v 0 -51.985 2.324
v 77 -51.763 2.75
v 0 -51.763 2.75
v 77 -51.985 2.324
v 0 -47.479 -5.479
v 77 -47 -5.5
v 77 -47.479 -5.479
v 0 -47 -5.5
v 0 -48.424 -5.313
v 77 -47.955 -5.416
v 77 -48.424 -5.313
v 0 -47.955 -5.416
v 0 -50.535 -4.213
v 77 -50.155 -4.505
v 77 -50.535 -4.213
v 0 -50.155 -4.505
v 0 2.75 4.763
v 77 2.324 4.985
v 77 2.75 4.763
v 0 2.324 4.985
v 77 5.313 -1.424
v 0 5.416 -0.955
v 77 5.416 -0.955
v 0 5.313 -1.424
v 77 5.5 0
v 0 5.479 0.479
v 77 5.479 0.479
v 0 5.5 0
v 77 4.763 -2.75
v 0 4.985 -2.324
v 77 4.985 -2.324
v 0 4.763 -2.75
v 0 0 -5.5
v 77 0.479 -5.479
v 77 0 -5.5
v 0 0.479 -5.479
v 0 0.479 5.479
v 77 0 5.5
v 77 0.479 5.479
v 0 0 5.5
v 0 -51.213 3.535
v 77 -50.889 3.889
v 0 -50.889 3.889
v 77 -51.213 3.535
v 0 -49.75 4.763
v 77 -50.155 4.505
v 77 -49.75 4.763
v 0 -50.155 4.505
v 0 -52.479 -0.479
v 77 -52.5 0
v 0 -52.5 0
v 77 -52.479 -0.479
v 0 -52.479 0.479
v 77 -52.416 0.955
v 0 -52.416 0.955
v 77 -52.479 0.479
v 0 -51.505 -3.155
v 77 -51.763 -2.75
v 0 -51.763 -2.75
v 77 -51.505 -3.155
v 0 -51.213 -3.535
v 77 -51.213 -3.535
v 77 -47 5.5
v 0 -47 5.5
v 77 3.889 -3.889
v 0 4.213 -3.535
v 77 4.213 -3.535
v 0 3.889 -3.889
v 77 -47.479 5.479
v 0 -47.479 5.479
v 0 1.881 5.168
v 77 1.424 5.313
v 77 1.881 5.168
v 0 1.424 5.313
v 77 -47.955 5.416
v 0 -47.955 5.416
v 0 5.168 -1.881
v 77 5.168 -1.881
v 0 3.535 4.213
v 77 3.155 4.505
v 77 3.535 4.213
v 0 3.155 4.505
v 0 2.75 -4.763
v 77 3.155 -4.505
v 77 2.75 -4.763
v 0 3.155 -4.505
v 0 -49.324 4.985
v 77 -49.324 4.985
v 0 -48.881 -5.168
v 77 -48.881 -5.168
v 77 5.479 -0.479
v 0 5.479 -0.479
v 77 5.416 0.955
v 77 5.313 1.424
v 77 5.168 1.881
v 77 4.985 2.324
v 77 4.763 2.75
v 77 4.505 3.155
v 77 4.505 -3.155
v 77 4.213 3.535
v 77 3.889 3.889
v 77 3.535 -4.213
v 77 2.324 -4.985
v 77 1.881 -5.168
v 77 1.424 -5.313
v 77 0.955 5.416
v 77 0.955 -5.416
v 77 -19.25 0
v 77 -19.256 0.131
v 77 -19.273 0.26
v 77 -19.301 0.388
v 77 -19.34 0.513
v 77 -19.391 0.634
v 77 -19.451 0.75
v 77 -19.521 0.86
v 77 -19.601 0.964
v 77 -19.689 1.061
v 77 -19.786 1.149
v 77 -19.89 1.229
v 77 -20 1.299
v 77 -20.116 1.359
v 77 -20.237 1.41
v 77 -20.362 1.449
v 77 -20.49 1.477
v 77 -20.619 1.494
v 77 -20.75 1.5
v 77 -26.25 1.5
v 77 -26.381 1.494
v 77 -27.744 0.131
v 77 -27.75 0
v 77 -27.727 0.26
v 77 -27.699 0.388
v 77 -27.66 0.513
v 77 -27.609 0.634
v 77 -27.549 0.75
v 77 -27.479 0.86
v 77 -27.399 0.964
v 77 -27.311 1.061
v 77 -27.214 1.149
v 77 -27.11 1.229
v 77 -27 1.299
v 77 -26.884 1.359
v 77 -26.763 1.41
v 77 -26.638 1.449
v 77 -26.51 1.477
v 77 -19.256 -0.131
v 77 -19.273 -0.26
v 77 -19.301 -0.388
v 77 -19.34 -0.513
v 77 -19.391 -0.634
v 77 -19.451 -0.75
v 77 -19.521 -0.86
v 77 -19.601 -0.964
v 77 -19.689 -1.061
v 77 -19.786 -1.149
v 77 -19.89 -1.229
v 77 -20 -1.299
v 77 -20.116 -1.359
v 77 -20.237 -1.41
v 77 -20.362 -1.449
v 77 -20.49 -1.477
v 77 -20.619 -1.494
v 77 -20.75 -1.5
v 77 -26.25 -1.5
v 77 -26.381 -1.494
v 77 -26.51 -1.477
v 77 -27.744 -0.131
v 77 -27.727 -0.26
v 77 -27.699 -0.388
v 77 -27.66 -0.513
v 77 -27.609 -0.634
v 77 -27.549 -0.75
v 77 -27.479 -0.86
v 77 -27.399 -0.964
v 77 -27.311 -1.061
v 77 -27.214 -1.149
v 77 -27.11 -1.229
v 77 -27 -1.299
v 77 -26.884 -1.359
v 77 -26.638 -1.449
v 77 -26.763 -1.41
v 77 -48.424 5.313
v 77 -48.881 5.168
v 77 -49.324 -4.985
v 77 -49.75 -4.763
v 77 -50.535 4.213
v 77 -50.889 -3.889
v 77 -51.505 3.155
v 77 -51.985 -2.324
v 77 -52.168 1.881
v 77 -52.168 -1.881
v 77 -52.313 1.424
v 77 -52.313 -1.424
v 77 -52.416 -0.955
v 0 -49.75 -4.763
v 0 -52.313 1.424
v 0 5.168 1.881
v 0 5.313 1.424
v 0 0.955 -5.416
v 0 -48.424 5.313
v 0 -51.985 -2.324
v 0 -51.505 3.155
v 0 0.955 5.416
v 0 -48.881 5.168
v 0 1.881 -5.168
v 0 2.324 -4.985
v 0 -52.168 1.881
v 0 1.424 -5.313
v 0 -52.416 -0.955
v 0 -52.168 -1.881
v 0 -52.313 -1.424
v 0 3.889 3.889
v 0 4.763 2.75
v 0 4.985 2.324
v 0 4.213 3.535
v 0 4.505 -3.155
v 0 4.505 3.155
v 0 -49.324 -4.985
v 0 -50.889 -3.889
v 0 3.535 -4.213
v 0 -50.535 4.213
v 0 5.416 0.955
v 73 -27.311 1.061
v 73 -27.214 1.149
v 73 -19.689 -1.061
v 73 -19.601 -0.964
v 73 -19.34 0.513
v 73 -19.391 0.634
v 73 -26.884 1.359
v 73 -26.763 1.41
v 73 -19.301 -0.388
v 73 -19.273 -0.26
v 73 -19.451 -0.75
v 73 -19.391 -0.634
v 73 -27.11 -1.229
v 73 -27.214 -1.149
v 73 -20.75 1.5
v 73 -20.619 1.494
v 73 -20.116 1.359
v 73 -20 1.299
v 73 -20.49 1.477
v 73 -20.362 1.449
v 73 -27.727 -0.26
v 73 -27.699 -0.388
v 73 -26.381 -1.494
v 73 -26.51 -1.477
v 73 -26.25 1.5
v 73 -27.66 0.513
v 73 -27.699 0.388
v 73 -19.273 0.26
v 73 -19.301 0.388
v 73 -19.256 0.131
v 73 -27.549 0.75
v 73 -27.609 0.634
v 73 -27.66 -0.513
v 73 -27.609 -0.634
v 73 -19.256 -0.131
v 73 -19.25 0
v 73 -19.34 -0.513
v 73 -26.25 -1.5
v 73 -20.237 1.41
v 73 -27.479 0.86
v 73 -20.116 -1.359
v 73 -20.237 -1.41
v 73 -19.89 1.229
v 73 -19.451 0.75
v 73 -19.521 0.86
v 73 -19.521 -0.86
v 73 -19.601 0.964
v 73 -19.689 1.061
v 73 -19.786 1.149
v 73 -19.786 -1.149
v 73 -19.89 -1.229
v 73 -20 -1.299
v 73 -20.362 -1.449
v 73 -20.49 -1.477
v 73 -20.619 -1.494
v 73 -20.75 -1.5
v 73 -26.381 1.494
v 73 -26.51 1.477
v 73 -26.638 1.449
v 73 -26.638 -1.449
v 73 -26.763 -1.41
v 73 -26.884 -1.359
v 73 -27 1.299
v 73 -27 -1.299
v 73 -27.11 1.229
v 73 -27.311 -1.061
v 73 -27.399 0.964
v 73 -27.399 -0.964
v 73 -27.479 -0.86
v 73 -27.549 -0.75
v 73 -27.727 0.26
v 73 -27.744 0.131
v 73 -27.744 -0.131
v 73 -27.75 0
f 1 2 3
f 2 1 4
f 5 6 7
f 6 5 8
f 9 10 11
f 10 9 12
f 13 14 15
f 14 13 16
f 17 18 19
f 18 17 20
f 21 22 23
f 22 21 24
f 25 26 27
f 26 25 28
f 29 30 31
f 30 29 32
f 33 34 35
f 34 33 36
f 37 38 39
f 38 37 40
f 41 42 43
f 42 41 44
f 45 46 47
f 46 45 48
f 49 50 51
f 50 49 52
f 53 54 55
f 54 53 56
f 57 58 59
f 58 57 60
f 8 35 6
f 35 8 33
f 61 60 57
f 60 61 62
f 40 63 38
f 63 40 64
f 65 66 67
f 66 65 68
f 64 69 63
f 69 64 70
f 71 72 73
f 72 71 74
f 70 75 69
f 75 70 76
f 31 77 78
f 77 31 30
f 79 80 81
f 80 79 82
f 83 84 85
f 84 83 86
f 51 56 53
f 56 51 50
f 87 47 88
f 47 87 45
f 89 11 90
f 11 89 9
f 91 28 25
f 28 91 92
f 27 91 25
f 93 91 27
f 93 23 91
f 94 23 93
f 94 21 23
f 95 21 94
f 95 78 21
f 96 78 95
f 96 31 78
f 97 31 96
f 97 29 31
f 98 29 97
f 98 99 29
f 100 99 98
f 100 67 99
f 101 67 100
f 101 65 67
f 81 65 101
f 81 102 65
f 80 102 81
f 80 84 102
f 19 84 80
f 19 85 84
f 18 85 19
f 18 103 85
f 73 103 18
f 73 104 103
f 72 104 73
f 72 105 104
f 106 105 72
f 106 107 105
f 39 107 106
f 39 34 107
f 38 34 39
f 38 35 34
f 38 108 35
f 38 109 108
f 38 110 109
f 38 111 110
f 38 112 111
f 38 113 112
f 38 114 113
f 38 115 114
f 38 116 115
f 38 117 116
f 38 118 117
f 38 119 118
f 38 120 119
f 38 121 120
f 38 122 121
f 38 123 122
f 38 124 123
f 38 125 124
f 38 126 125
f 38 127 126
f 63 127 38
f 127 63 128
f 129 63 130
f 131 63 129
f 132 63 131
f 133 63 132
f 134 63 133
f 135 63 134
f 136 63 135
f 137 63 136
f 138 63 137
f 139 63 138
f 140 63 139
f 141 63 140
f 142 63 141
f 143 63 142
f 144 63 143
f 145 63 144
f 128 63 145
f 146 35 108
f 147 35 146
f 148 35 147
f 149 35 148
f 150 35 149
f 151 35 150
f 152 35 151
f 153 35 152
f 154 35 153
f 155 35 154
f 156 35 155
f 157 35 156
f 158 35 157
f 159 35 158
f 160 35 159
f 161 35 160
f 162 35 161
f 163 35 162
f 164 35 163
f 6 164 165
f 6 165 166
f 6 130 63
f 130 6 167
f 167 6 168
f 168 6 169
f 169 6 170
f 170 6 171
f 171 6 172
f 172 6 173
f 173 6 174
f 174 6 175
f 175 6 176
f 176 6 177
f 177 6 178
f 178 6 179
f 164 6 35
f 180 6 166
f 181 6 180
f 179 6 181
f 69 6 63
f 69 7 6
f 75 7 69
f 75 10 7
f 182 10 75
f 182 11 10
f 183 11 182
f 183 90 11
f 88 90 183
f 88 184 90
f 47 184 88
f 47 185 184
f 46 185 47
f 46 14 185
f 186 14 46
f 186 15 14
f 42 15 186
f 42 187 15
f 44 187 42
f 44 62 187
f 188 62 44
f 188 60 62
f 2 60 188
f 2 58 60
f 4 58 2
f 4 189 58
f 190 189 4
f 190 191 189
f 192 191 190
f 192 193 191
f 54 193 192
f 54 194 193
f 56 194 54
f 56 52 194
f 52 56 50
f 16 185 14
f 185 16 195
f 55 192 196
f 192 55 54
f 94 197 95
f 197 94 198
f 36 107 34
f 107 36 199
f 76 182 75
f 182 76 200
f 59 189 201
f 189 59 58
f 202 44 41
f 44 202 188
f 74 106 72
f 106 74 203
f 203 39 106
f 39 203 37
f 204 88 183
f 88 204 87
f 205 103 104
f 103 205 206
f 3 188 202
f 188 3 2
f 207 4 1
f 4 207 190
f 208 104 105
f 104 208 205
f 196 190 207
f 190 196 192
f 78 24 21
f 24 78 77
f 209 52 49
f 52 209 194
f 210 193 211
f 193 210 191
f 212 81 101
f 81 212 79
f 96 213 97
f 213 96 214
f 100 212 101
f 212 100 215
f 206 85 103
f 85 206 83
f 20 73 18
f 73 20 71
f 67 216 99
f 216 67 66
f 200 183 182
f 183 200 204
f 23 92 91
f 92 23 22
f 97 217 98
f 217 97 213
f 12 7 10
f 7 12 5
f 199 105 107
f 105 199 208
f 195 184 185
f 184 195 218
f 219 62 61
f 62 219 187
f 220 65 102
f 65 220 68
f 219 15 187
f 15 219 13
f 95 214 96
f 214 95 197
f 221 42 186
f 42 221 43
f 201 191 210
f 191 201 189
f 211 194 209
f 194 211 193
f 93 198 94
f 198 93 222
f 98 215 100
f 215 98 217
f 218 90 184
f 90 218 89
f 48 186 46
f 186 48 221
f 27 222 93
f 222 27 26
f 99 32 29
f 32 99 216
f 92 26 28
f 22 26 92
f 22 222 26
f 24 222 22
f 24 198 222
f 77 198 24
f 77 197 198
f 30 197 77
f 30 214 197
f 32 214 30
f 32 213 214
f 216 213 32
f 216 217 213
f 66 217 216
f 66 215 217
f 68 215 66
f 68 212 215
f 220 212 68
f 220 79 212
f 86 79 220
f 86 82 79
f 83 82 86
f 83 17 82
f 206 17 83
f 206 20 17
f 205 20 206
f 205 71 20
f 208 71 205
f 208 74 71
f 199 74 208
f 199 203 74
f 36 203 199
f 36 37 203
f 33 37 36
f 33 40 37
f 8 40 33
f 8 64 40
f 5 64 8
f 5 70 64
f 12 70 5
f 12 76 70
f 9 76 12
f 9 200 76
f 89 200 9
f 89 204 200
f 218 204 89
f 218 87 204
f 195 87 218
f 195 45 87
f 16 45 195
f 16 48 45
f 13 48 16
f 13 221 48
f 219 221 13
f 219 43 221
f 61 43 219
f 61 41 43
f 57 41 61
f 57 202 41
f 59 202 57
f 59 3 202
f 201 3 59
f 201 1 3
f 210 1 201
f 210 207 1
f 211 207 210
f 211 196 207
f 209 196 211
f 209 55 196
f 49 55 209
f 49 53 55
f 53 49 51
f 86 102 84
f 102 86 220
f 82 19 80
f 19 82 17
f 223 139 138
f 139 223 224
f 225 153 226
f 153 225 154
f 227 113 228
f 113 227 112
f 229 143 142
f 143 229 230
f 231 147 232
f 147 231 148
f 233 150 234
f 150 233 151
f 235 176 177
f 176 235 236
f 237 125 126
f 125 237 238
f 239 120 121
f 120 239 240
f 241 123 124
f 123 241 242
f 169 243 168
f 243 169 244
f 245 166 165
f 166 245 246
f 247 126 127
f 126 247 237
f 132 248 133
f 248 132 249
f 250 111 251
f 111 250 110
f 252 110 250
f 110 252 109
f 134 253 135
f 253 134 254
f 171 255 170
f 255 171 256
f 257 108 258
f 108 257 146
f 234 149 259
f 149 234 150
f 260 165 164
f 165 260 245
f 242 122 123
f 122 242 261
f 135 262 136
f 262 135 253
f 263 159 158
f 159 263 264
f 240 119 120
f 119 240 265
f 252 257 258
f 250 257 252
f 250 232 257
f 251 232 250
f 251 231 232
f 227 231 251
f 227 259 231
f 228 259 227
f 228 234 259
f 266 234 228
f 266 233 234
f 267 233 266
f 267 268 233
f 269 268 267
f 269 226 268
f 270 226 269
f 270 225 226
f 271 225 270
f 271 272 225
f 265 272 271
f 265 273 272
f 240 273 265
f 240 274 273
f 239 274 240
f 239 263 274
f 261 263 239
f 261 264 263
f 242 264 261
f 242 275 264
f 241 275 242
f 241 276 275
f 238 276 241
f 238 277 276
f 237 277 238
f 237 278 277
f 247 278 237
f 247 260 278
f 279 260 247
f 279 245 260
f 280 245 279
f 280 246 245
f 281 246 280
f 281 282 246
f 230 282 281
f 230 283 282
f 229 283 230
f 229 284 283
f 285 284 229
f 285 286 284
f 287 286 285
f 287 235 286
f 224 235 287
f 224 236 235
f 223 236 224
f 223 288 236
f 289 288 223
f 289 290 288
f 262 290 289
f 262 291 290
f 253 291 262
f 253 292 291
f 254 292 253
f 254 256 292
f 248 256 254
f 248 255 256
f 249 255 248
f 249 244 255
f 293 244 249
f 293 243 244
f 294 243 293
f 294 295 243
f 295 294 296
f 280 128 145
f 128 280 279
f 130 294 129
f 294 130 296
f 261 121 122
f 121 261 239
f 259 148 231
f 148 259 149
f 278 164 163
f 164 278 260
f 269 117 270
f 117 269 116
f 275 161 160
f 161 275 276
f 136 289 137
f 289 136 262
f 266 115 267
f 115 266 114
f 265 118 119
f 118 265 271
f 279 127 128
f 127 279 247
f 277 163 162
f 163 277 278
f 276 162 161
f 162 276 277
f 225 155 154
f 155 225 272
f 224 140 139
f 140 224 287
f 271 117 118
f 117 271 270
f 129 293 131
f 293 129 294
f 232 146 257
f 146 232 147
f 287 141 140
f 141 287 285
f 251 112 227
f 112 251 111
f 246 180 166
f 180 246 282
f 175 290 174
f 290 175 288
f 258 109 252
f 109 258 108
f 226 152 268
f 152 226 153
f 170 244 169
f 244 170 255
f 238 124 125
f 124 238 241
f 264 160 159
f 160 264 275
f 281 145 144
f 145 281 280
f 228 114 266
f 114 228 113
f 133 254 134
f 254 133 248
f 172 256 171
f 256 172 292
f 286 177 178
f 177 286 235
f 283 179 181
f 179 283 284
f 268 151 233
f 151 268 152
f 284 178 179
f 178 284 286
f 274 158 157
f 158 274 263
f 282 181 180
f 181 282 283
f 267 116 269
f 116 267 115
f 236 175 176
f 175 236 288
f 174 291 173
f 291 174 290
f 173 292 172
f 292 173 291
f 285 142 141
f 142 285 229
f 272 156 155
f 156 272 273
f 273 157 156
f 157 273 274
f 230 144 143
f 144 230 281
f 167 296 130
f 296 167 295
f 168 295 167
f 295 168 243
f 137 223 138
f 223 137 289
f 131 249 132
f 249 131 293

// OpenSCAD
// External SSD Geometry

// Global resolution
$fs = 0.1;  // Don't generate smaller facets than 0.1 mm
$fa = 5;    // Don't generate larger angles than 5 degrees

module ssd() {
  color("Gray")
  difference() {
    hull() {
      rotate([0, 90, 0]) cylinder(h=77.0, r=5.5);
      translate([0.0, -47.0, 0.0]) rotate([0, 90, 0]) cylinder(h=77.0, r=5.5);
    }
    hull() {
      translate([73.0, -20.75, 0.0]) rotate([0, 90, 0]) cylinder(h=5.0, r=1.5);
      translate([73.0, -26.25, 0.0]) rotate([0, 90, 0]) cylinder(h=5.0, r=1.5);
    }
  }
}

ssd();
